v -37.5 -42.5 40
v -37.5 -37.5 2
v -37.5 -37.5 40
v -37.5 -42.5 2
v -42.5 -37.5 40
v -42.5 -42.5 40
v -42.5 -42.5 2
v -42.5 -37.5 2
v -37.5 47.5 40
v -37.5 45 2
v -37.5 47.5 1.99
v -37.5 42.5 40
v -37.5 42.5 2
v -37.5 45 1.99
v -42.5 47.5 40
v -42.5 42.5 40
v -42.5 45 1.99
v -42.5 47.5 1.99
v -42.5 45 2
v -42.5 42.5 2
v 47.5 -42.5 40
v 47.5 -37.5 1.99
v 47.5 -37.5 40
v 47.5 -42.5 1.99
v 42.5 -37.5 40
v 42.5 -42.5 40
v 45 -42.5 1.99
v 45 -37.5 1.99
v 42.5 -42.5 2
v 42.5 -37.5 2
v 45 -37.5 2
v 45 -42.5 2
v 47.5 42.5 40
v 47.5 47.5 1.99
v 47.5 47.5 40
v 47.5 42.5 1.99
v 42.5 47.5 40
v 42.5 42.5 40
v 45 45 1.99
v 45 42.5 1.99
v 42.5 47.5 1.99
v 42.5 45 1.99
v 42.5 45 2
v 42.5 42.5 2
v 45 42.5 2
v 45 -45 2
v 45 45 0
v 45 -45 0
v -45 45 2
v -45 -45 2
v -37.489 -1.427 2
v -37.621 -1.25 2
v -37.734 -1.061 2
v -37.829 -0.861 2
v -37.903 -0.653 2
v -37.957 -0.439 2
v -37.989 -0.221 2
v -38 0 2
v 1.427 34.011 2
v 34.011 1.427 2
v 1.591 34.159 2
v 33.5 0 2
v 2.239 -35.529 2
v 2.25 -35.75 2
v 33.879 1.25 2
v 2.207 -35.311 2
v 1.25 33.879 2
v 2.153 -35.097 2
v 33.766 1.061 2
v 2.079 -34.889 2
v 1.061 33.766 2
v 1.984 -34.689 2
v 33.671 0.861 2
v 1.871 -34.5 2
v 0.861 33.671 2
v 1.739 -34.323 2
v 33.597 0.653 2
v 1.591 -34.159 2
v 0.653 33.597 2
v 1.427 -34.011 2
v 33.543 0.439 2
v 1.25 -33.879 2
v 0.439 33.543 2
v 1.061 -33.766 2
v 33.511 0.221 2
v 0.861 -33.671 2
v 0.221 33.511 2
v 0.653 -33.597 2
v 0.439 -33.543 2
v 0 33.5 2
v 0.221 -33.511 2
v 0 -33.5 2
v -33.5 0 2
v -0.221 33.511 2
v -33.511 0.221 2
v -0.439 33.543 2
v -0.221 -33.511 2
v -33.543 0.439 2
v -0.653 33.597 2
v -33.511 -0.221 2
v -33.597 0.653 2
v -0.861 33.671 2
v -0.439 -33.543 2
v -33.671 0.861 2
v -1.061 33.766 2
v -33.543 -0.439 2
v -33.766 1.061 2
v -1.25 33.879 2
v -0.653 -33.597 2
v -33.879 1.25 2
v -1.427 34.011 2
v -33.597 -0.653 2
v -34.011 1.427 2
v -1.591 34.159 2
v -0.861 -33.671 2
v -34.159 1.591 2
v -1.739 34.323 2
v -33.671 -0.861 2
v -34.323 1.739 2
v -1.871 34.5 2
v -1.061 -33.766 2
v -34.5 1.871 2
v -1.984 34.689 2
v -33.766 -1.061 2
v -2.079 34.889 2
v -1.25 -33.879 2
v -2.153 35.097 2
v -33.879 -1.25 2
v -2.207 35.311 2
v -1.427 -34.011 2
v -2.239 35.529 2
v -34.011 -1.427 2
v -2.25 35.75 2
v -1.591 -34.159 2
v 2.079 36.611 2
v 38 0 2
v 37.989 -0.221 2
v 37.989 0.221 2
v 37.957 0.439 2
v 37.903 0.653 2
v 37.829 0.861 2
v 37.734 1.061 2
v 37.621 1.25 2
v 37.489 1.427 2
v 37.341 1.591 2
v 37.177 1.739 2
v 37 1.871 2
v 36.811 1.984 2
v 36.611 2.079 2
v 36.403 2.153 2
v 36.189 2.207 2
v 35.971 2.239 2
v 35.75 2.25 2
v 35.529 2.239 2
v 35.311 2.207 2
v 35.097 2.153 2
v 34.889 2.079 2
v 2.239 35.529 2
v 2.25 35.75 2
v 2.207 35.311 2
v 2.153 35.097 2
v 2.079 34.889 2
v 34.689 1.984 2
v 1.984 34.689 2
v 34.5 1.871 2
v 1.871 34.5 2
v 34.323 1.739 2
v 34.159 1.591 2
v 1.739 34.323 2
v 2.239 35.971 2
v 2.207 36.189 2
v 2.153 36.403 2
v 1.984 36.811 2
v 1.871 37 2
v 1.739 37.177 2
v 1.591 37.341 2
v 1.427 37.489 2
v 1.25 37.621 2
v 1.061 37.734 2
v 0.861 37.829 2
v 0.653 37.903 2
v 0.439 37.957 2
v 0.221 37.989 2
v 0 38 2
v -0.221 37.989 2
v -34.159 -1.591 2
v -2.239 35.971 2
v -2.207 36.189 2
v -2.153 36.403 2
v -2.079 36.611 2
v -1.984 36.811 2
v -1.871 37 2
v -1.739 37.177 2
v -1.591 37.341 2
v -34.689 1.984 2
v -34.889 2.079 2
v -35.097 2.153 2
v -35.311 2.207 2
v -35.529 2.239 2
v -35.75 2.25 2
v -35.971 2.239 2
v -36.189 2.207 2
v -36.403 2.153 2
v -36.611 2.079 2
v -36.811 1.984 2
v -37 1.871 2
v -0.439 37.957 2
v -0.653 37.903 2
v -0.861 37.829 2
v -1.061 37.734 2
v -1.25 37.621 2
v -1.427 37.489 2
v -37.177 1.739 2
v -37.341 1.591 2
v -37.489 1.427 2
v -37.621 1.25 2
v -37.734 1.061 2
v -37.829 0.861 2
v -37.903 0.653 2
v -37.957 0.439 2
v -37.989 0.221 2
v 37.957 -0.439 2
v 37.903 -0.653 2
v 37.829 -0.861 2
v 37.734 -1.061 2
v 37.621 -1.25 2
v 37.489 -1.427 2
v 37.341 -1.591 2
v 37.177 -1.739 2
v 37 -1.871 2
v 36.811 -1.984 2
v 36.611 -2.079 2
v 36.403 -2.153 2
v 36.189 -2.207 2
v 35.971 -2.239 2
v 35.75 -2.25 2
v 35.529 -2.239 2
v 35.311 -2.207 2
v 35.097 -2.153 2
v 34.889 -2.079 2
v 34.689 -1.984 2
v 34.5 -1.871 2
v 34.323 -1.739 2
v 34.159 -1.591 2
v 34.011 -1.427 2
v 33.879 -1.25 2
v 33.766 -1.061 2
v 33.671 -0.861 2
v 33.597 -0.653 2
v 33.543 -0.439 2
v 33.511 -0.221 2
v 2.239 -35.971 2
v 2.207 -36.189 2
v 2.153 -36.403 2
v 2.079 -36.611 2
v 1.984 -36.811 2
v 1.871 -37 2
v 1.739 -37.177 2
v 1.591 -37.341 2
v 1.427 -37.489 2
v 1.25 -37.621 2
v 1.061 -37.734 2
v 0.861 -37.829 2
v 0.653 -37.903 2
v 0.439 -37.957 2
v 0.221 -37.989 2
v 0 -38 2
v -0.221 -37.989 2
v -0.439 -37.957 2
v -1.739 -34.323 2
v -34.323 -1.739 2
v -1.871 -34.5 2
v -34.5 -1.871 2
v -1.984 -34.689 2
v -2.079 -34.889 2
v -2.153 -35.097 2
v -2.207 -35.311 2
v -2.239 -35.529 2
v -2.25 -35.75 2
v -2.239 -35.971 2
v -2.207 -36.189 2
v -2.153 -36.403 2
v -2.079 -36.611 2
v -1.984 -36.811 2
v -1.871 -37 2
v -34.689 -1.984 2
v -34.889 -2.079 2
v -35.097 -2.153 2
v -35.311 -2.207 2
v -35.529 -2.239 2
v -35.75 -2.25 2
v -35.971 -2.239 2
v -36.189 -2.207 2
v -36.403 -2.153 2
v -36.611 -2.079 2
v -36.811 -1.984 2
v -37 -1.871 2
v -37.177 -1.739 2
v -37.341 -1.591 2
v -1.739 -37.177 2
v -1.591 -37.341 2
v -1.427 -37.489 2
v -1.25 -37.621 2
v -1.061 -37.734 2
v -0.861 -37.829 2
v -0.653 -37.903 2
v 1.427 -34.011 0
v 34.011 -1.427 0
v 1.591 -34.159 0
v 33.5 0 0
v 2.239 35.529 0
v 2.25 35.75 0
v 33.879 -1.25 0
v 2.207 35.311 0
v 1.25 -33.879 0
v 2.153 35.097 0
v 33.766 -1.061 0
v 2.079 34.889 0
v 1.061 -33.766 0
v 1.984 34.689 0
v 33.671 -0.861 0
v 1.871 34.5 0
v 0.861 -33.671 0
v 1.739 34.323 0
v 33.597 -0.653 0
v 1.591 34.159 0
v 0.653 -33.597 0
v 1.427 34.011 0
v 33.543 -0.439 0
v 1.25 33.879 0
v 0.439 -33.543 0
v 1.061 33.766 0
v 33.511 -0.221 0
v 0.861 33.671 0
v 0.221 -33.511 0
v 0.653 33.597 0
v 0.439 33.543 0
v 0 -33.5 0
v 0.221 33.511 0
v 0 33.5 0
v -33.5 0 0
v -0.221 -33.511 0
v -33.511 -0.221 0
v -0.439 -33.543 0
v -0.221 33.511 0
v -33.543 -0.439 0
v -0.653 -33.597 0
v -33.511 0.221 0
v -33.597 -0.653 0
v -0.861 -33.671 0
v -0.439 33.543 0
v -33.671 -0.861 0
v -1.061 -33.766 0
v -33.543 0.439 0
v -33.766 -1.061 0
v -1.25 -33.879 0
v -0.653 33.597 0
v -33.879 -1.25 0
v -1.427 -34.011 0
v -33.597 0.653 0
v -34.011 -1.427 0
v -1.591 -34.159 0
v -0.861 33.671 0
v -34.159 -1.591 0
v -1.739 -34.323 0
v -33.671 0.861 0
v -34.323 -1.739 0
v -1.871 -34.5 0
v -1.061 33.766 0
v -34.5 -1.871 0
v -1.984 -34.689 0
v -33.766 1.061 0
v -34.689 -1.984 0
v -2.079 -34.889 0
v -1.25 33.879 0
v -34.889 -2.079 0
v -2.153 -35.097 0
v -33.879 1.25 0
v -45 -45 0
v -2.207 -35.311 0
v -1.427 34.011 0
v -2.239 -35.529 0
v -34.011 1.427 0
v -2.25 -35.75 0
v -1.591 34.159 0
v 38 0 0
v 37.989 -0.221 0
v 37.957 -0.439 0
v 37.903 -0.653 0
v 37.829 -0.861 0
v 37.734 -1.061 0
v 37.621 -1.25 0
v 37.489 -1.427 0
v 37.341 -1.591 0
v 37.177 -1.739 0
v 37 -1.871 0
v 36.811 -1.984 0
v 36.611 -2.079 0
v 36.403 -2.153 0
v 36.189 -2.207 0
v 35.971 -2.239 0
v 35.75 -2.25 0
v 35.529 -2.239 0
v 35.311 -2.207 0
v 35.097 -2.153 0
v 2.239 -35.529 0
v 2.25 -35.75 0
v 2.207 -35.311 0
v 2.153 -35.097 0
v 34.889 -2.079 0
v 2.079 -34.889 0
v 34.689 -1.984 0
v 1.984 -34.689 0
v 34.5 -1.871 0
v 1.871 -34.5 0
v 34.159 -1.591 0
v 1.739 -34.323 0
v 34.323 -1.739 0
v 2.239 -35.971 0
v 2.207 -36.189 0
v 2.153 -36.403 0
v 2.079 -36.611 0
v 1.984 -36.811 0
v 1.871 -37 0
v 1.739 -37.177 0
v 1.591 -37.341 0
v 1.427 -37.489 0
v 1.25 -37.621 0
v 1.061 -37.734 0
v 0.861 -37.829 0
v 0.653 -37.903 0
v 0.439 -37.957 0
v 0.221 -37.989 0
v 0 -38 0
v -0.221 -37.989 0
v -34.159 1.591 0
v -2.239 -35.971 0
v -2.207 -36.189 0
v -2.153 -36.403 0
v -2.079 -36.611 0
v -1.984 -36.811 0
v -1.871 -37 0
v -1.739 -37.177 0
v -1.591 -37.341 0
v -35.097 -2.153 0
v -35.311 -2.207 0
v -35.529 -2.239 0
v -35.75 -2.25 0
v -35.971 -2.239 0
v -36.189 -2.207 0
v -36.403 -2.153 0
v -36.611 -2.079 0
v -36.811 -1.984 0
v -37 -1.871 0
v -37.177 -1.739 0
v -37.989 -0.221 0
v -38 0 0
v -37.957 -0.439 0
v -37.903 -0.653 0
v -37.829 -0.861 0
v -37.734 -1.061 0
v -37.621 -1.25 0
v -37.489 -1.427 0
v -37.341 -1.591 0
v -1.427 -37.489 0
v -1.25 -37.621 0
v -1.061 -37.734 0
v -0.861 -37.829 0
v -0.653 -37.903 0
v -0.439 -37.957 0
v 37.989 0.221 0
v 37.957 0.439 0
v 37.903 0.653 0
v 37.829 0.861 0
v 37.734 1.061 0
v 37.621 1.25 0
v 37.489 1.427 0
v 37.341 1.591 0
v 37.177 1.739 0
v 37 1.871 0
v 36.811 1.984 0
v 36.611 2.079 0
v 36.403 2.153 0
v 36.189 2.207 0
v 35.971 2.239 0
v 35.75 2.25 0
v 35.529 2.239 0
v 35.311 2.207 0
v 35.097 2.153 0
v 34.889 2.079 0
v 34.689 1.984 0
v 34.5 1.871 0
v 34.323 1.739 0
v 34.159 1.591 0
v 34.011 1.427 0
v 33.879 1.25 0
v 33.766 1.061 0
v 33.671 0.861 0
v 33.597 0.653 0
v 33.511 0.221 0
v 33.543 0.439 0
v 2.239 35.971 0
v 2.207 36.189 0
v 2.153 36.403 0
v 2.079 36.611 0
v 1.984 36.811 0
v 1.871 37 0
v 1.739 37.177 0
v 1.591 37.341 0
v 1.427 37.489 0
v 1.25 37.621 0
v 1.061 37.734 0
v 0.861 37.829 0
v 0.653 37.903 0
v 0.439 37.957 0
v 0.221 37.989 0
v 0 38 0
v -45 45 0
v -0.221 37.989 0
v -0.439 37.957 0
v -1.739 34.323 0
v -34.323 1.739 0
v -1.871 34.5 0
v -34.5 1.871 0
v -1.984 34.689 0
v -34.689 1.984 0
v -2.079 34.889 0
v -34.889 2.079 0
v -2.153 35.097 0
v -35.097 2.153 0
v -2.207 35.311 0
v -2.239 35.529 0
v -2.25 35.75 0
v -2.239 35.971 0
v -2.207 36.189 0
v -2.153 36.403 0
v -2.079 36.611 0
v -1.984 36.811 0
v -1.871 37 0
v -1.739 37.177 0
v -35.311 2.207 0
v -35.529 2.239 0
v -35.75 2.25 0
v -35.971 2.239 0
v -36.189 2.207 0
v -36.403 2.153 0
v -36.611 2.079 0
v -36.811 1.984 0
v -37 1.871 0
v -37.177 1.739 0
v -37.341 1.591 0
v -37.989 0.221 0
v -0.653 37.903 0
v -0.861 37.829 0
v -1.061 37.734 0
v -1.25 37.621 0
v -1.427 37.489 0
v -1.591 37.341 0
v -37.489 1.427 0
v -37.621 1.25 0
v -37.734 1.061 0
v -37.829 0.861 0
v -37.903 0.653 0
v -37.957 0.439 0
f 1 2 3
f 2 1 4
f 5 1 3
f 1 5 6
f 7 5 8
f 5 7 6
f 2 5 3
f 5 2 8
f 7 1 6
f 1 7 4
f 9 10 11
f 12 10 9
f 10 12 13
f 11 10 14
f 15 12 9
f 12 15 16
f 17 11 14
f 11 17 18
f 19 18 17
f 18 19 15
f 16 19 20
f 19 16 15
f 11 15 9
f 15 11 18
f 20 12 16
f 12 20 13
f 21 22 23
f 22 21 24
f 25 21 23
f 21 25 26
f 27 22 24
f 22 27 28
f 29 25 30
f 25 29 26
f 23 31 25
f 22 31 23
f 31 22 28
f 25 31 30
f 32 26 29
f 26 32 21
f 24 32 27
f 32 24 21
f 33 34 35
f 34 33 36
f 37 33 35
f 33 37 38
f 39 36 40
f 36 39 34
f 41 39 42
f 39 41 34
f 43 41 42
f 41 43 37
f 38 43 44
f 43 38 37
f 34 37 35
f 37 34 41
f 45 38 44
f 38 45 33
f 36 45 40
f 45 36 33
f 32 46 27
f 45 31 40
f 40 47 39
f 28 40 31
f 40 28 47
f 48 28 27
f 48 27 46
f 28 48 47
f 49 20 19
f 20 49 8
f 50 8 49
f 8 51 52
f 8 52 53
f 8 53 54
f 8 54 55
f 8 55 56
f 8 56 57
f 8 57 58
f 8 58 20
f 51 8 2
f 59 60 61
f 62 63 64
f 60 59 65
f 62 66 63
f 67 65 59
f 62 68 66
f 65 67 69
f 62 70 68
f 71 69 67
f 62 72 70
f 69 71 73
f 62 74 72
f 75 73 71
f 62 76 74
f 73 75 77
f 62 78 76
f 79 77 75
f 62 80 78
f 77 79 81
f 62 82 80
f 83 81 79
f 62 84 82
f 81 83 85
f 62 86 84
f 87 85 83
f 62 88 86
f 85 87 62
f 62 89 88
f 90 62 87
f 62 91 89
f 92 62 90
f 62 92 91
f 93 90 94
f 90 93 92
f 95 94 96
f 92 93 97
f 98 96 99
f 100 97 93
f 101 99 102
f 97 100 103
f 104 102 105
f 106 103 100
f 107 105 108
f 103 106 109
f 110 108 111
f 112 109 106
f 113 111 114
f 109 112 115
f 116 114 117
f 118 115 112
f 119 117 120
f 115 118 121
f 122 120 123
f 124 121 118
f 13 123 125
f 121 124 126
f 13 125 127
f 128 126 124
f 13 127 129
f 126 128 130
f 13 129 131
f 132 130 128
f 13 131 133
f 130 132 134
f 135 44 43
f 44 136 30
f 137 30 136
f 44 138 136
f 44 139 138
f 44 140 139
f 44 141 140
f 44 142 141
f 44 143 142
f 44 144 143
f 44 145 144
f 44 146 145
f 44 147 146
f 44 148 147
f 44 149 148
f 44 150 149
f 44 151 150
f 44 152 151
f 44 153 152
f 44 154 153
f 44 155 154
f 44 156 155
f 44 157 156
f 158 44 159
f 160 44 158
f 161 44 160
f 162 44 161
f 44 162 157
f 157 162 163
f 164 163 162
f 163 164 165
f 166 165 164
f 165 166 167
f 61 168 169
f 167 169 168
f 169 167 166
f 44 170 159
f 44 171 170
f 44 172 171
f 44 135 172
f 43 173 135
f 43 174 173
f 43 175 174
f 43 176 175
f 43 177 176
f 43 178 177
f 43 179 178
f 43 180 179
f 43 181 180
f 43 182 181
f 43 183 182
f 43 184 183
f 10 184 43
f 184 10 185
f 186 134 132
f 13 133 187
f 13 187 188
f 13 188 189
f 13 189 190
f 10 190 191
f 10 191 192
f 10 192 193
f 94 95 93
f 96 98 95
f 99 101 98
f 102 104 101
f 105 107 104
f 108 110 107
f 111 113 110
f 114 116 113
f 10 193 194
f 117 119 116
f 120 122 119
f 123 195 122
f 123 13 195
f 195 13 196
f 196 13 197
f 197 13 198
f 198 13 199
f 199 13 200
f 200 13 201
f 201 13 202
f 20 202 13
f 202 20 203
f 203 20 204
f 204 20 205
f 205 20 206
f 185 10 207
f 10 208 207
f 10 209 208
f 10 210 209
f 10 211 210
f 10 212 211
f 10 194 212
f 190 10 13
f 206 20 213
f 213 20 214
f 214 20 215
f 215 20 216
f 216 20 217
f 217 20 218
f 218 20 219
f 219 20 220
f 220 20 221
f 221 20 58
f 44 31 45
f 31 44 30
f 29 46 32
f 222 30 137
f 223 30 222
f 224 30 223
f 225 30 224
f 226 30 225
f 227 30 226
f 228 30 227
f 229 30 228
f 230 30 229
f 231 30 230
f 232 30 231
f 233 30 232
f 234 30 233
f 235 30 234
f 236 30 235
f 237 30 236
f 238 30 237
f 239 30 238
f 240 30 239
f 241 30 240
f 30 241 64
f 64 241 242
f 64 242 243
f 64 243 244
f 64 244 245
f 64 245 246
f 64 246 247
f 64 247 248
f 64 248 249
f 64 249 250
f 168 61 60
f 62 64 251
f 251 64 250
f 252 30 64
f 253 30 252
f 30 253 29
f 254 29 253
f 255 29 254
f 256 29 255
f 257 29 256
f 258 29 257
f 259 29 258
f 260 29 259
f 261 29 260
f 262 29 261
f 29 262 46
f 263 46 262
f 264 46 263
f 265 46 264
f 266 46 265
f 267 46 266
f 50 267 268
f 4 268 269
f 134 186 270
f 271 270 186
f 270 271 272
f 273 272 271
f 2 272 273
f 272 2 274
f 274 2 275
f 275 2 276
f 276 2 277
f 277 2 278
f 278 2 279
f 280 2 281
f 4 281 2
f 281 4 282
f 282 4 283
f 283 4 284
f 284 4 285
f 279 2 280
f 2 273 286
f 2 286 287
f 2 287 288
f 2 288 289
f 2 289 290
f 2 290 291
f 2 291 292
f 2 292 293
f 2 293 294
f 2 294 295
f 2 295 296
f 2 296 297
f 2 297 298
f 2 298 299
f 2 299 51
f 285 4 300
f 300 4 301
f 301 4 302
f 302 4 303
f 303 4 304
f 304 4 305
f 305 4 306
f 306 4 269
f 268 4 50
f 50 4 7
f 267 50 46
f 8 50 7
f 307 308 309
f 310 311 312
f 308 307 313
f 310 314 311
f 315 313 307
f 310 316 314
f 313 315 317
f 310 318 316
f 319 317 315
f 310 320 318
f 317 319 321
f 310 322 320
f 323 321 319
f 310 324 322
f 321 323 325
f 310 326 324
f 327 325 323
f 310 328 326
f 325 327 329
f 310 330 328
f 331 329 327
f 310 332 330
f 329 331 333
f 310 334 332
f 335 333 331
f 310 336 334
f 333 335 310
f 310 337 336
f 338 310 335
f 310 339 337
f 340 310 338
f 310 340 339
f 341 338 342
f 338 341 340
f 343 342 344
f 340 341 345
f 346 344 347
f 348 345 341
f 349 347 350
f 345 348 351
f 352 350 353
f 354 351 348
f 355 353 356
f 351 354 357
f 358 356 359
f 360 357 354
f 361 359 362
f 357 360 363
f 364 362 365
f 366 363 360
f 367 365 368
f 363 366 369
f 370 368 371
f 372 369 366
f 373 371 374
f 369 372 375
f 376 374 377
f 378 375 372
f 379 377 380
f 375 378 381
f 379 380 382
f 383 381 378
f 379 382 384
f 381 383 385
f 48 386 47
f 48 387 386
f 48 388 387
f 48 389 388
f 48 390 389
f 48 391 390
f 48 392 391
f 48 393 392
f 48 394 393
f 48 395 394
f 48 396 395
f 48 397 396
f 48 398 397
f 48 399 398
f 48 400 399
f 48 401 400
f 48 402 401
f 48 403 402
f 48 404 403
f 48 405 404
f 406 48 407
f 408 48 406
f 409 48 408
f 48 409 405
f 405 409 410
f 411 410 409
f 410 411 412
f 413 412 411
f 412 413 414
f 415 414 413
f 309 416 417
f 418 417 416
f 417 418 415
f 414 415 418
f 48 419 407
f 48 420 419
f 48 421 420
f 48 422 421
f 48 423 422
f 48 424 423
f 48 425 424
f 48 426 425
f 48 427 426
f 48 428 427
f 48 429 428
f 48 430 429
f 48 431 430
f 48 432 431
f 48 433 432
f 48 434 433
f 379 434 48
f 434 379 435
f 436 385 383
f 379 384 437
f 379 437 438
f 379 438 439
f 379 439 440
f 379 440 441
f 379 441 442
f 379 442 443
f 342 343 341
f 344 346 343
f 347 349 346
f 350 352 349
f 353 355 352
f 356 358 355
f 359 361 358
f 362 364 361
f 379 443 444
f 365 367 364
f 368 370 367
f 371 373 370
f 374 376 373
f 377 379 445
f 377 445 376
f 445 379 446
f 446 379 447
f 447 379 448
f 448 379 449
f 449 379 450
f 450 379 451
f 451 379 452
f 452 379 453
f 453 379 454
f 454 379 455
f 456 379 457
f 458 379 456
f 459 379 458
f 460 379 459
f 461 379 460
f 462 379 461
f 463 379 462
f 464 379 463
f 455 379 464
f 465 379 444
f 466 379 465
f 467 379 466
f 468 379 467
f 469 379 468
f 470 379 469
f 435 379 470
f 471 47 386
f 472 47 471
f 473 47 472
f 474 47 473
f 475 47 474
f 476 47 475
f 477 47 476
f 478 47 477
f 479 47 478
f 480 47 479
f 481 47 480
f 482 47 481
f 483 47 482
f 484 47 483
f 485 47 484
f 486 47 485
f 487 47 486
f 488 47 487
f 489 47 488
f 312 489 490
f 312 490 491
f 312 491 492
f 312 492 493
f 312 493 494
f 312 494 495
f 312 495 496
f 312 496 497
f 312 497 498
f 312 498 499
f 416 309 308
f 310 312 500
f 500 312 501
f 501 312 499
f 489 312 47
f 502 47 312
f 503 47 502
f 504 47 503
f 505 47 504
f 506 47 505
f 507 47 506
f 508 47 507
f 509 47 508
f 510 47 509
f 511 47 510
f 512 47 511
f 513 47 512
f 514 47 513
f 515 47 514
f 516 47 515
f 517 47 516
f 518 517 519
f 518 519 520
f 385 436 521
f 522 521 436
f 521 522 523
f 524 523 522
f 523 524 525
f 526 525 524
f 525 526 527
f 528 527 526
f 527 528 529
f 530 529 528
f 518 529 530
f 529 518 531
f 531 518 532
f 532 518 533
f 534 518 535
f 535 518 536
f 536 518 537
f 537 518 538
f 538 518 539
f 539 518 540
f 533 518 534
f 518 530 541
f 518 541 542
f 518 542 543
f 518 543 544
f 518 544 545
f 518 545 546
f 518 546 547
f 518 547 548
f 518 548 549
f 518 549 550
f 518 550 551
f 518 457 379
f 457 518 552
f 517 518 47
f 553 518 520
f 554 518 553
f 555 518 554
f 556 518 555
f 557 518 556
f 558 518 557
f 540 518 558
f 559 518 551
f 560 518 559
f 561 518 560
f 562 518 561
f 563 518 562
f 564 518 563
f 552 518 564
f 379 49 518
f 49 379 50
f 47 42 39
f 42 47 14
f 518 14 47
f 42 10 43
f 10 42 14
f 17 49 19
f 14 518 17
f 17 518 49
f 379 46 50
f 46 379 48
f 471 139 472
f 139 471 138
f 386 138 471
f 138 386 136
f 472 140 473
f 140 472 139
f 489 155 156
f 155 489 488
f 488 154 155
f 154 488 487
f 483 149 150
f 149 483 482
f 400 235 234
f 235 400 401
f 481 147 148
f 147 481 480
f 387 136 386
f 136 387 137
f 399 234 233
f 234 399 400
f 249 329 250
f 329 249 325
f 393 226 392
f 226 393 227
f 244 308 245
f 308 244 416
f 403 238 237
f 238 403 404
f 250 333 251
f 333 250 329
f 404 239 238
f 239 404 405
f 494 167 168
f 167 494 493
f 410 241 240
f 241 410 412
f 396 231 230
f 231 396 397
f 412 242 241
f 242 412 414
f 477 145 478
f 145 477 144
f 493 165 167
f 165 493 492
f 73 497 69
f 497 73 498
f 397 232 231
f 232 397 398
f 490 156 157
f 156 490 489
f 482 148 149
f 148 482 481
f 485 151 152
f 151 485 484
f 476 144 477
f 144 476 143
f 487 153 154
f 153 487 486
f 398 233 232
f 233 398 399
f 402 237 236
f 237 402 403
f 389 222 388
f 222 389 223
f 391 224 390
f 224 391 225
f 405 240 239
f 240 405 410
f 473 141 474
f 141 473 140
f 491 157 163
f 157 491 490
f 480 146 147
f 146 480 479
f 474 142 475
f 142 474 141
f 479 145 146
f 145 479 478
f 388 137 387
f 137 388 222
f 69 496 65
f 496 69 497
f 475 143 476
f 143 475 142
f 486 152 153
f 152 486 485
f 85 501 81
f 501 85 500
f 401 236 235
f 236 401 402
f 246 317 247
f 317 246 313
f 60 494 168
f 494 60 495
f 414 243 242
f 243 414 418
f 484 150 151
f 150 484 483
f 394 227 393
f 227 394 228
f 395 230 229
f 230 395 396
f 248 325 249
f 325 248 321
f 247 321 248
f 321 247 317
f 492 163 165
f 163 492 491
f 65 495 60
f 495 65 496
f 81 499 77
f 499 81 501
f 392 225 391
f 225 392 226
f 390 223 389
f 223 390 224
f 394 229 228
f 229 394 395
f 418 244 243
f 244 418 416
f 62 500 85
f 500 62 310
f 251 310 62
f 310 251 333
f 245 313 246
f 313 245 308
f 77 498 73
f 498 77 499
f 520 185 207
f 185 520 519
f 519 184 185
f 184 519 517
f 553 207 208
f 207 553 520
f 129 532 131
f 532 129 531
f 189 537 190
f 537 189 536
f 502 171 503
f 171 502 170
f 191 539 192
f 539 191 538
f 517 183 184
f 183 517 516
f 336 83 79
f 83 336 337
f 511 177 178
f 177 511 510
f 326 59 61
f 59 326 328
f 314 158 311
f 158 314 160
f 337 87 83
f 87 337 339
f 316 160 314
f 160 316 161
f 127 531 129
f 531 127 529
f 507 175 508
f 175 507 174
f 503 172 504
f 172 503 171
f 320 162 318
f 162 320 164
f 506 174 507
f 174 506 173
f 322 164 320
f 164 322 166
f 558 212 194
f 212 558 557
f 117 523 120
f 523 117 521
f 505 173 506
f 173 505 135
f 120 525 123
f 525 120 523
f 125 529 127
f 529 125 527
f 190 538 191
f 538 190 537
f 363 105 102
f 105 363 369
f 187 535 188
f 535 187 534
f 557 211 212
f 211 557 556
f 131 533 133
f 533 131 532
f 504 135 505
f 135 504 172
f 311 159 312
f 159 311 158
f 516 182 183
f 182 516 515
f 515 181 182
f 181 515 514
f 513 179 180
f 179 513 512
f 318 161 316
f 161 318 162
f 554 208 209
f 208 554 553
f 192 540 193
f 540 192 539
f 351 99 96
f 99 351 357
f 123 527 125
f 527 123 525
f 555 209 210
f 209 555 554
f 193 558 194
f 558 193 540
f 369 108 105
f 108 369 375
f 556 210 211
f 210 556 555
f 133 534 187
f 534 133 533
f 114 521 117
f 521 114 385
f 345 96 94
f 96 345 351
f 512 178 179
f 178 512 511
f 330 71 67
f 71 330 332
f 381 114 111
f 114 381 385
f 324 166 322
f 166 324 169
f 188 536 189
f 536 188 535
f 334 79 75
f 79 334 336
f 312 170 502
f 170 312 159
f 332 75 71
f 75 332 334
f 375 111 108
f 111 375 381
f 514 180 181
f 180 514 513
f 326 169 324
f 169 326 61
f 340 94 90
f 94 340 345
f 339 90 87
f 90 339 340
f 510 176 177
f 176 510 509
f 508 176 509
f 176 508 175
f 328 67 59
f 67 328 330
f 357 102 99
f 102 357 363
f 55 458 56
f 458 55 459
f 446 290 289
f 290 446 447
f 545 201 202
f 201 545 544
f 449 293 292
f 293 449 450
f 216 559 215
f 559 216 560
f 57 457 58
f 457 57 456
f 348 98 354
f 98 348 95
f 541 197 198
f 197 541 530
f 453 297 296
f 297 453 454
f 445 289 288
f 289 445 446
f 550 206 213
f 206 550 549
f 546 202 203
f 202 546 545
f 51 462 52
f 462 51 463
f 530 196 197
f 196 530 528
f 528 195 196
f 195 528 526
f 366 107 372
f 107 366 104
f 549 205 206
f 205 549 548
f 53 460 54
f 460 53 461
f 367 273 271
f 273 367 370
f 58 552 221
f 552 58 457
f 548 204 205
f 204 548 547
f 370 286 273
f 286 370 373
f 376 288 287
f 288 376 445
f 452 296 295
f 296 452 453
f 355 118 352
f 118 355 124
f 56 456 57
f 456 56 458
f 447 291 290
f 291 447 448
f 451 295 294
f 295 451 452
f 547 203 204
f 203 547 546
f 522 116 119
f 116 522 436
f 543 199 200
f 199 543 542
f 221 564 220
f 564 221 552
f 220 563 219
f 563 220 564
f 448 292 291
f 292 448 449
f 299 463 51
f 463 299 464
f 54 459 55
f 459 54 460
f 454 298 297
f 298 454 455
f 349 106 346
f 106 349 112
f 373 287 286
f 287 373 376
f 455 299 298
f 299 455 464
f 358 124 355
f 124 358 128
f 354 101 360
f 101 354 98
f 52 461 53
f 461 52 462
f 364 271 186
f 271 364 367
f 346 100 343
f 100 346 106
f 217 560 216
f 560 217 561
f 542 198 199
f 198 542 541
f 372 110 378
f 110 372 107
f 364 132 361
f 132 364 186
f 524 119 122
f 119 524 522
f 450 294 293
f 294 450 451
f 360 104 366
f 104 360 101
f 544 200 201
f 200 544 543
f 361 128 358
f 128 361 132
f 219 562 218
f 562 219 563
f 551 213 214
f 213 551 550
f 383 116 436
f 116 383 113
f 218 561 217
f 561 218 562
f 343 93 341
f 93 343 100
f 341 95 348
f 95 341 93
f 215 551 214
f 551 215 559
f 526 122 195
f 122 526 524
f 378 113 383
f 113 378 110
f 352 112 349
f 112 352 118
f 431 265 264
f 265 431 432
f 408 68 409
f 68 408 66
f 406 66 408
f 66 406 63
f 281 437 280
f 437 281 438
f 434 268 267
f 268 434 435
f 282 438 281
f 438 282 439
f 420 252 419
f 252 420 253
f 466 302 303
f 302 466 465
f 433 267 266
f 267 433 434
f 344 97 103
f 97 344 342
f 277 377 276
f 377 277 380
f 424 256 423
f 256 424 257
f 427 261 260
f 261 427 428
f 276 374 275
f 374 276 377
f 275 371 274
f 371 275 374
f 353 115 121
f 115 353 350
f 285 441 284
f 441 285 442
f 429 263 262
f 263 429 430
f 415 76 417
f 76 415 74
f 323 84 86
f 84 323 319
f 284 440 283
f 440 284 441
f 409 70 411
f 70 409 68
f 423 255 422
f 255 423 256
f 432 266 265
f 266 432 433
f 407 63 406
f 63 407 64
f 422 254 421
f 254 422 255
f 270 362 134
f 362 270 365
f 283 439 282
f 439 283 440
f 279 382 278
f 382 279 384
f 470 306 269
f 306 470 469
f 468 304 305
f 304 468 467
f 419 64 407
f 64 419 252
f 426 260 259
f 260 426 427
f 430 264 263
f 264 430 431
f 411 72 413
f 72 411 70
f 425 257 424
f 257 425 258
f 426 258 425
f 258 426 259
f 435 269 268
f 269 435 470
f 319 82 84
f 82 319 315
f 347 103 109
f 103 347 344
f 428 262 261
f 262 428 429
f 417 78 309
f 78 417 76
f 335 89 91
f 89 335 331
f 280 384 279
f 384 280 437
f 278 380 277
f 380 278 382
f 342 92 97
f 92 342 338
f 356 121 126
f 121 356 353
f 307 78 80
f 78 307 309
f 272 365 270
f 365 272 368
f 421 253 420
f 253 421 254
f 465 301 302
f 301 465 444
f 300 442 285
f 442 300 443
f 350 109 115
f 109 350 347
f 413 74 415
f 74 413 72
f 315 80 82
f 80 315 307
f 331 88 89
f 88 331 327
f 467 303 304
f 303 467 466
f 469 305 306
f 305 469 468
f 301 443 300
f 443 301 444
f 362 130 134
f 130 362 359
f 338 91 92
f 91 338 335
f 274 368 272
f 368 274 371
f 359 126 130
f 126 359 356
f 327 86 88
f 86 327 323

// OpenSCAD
// DIY magnetic stirrer housing for 80 mm PC case fan
// Print orientation: top plate on bed (z = 0), walls build upward (+Z)
// Note: this is the upside-down open-box orientation relative to use

// ---------------- Parameters ----------------
outer_x      = 90;    // outer size in X (mm)
outer_y      = 90;    // outer size in Y (mm)
top_plate_t  = 2;     // top plate thickness (mm), z = 0..2
wall_t       = 2.5;   // wall thickness (mm)
open_top_z   = 40;    // height of open top edge (mm)
hole_d       = 4.5;   // M4 screw hole diameter (mm)
hole_pitch   = 71.5;  // square pattern side for screw holes (mm)
notch_w      = 12;    // power cable notch width (mm)
notch_depth  = 8;     // notch depth from open edge (mm), z = 32..40
eps          = 0.5;   // cutter overshoot past faces (mm)
$fn          = 64;    // curve resolution

// ---------------- Model ----------------
difference() {
    union() {
        // Top plate
        translate([-outer_x/2, -outer_y/2, 0])
            cube([outer_x, outer_y, top_plate_t]);

        // Four walls from top plate up to open top
        for (x = [-1, 1], y = [-1, 1])
            translate([x * (outer_x/2 - wall_t), y * (outer_y/2 - wall_t), top_plate_t - 0.01])
                cube([2 * wall_t, 2 * wall_t, open_top_z - top_plate_t + 0.01]);
    }

    // Screw holes through top plate on square pattern
    for (a = [0, 90, 180, 270])
        rotate([0, 0, a])
            translate([hole_pitch/2, 0, -eps])
                cylinder(d = hole_d, h = top_plate_t + 2 * eps);

    // Power cable notch in one wall, 8 mm down from open edge
    translate([-notch_w/2, outer_y/2 - wall_t, open_top_z - notch_depth])
        cube([notch_w, wall_t + eps, notch_depth + eps]);
}
